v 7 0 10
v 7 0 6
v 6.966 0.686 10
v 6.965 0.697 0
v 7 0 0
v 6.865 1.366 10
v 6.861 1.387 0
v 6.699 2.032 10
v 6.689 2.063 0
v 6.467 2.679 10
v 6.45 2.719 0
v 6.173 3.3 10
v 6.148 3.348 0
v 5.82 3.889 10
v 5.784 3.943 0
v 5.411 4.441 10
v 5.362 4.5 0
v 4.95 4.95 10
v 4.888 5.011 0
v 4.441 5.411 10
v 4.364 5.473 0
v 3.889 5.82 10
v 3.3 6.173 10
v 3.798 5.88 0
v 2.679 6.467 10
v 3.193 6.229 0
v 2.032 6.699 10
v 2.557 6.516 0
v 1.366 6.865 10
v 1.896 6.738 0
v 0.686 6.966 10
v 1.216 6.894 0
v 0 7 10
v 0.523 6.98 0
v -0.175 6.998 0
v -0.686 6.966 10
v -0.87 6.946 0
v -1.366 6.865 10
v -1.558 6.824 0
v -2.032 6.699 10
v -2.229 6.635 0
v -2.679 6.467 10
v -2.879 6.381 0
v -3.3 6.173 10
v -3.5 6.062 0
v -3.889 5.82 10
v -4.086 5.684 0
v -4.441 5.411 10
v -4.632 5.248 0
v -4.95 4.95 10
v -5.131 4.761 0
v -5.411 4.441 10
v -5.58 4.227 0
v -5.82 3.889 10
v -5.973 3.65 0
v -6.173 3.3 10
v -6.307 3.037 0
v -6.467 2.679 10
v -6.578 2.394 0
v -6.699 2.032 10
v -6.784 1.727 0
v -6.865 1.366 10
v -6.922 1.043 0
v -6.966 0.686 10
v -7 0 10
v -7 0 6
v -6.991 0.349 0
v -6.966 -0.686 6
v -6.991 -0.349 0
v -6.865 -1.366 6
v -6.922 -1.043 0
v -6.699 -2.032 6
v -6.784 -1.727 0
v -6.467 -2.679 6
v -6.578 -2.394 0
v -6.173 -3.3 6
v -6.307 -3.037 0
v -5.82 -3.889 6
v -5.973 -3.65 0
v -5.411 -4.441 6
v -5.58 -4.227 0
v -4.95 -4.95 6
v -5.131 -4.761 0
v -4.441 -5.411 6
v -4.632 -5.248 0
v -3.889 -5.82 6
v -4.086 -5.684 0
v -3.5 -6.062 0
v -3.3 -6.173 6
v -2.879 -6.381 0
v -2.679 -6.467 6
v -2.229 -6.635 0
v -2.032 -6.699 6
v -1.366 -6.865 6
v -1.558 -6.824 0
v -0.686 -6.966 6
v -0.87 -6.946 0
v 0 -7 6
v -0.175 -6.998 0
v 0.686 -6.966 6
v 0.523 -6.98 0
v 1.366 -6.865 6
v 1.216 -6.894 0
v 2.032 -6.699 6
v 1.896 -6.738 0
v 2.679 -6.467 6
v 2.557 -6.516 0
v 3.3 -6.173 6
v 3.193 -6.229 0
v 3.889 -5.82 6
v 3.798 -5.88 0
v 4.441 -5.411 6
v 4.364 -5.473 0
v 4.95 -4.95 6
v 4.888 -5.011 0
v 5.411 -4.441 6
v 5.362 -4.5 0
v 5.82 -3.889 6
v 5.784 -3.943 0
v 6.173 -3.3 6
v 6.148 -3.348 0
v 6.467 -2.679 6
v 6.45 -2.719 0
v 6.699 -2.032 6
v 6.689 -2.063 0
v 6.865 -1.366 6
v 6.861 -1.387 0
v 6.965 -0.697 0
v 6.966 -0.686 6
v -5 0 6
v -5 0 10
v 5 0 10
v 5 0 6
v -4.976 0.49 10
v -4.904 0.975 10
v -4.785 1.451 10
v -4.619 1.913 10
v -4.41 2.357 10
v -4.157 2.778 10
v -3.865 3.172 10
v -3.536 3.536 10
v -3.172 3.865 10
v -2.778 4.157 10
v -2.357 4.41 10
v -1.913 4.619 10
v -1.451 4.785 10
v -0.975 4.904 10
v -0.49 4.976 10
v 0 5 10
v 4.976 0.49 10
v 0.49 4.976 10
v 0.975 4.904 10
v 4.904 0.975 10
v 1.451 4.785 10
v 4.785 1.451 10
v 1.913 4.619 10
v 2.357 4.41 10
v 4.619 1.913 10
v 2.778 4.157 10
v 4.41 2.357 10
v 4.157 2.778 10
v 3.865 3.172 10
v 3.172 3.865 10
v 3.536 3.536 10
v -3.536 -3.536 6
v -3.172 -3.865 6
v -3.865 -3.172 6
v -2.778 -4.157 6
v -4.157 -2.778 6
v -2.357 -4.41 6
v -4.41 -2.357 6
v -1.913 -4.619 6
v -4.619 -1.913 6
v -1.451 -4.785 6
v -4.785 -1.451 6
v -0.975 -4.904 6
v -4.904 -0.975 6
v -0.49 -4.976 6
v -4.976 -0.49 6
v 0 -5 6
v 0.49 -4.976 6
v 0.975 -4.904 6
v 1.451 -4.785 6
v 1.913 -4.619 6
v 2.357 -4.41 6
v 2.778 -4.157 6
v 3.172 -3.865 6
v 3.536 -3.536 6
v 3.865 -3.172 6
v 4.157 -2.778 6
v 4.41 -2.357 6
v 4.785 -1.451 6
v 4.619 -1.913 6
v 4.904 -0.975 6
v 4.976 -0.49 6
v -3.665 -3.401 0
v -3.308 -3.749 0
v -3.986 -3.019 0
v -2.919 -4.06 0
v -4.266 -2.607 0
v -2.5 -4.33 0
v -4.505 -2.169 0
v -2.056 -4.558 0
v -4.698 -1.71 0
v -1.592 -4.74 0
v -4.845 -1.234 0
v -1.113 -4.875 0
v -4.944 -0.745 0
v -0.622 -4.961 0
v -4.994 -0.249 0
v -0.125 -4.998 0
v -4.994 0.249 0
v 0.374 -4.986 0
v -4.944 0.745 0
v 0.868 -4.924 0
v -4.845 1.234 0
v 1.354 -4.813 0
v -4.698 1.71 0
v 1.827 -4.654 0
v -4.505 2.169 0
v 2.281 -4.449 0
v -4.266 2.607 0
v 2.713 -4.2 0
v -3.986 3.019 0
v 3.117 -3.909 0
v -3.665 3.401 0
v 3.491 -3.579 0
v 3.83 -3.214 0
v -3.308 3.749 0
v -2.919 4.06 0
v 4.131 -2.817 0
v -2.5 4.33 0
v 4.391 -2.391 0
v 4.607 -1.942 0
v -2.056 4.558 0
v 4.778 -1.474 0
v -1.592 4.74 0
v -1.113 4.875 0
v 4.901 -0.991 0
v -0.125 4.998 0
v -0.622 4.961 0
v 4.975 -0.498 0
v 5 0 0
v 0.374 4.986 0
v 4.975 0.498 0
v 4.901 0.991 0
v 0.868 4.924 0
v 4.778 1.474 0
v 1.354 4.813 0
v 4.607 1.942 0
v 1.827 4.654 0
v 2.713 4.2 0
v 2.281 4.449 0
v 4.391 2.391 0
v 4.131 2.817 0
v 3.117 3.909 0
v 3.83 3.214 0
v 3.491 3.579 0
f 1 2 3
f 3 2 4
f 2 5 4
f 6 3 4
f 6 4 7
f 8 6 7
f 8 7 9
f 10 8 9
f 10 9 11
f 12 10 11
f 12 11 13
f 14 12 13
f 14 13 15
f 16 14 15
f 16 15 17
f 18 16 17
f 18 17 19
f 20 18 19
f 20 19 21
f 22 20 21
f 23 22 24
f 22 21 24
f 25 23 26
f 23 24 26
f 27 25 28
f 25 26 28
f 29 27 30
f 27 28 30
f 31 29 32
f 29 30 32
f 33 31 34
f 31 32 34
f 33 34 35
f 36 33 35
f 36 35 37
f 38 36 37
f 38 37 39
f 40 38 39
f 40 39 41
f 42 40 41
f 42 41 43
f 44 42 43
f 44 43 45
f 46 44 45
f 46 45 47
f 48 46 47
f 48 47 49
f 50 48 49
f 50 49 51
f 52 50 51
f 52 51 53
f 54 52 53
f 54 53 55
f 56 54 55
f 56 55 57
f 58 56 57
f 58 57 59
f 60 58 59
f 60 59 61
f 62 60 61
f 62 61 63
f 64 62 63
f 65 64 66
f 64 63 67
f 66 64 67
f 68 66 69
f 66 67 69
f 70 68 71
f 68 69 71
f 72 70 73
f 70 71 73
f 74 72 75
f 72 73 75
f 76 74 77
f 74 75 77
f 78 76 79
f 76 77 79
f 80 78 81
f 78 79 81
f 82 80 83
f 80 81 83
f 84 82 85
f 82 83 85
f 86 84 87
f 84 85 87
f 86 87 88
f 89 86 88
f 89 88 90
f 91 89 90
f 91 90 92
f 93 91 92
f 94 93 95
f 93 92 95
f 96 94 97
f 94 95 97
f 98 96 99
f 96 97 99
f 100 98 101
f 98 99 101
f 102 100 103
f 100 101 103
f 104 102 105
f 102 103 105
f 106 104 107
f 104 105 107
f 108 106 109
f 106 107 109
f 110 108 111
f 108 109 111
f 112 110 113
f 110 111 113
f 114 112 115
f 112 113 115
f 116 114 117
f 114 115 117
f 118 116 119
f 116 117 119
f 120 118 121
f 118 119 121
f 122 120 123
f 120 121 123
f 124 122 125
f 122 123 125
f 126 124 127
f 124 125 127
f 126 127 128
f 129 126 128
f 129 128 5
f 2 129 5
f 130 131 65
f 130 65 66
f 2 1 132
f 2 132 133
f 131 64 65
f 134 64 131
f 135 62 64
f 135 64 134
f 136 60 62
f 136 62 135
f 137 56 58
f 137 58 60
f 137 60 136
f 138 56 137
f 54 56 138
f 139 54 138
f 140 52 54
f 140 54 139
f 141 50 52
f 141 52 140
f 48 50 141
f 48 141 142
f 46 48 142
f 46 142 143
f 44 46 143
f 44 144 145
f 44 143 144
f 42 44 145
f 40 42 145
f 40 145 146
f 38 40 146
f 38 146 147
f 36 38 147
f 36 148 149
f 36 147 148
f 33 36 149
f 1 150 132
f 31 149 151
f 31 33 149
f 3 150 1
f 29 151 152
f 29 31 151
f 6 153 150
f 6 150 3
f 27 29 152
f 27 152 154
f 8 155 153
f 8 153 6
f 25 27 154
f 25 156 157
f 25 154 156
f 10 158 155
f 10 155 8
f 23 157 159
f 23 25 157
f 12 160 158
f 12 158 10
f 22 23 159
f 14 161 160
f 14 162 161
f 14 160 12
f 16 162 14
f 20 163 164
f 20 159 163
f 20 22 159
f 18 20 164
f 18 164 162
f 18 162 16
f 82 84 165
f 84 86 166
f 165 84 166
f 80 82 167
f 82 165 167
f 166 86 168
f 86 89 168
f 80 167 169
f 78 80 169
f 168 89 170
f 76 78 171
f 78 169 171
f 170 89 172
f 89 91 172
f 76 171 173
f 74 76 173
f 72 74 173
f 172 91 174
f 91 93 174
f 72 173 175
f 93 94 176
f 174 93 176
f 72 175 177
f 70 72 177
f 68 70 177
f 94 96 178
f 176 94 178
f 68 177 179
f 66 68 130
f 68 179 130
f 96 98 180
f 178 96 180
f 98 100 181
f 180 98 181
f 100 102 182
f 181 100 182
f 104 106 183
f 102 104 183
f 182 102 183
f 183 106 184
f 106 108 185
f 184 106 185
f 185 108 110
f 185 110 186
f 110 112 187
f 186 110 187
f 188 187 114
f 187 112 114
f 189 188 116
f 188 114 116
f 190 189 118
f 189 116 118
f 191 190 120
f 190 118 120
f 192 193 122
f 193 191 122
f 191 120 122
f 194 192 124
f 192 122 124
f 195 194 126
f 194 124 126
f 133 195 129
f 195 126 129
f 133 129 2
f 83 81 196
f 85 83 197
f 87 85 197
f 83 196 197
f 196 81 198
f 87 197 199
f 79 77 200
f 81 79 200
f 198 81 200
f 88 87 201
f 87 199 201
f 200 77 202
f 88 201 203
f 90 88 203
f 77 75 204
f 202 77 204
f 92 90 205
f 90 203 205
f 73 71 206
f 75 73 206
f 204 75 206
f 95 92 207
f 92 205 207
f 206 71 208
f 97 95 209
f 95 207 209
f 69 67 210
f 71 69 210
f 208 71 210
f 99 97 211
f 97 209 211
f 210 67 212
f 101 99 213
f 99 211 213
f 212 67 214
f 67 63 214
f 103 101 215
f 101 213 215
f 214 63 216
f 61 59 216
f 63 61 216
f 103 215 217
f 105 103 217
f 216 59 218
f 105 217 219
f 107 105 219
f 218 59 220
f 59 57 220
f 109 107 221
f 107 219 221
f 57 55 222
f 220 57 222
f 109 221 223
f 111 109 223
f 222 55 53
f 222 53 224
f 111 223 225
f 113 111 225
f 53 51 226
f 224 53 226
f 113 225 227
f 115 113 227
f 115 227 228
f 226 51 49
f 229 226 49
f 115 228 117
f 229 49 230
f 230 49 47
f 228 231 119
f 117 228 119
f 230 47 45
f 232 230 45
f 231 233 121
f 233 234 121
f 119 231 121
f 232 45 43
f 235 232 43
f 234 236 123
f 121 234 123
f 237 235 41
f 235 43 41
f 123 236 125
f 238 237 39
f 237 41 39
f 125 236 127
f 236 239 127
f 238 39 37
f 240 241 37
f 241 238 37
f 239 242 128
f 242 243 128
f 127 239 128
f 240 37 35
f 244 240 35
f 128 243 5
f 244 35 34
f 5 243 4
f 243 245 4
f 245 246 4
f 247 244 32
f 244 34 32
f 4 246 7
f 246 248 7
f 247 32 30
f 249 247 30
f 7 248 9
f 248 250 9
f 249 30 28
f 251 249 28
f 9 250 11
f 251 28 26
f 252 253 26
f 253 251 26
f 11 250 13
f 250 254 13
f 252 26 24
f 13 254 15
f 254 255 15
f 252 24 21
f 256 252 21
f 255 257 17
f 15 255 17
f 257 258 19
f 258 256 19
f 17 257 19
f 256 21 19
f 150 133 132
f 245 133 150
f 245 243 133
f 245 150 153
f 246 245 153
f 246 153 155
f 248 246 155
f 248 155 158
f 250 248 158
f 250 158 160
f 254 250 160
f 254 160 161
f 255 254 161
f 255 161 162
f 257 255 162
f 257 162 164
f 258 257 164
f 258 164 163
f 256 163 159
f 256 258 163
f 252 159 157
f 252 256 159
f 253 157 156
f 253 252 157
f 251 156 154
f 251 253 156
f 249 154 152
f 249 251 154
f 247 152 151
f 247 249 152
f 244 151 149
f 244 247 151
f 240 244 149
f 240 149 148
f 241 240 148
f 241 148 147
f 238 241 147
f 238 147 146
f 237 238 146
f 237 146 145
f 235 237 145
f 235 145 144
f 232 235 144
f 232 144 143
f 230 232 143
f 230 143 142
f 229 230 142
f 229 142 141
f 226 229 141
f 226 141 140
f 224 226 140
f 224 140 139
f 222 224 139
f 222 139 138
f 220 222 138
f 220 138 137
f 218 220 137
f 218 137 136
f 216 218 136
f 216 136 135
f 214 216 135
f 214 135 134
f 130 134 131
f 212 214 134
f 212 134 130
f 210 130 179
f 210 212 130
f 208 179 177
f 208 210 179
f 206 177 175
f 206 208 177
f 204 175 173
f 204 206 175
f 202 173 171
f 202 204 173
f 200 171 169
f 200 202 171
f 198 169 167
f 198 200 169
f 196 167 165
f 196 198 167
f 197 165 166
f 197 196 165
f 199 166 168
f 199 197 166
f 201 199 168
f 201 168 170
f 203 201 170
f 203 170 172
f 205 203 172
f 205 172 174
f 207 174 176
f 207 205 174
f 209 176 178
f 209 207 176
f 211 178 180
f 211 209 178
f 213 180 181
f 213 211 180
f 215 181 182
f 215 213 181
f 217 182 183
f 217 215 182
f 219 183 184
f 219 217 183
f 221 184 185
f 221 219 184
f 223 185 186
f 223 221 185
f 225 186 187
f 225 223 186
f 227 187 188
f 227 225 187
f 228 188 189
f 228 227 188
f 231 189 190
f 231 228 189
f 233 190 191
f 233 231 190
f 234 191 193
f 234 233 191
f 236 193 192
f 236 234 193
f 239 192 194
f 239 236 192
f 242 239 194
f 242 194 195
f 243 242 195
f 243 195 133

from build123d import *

# Parameters (mm, degrees)
SKETCH1_R           = 7
SKETCH1_R_2         = 5
BOSS_EXTRUDE1_DEPTH = 10
SKETCH3_W           = 4
SKETCH3_H           = 7
CUT_EXTRUDE1_DEPTH  = 10


with BuildPart() as part:
    # Sketch1 → Boss-Extrude1 (new body)
    with BuildSketch(Plane.XY):
        Circle(SKETCH1_R)
        Circle(SKETCH1_R_2, mode=Mode.SUBTRACT)
    extrude(amount=BOSS_EXTRUDE1_DEPTH)

    # Sketch3 → Cut-Extrude1 (cut, symmetric)
    with BuildSketch(Plane(origin=(0, 0, 0), x_dir=(0, 0, -1), z_dir=(1, 0, 0))):
        with Locations((-8, -3.5)):
            Rectangle(SKETCH3_W, SKETCH3_H)
    extrude(amount=CUT_EXTRUDE1_DEPTH, both=True, mode=Mode.SUBTRACT)


solid = part.part
